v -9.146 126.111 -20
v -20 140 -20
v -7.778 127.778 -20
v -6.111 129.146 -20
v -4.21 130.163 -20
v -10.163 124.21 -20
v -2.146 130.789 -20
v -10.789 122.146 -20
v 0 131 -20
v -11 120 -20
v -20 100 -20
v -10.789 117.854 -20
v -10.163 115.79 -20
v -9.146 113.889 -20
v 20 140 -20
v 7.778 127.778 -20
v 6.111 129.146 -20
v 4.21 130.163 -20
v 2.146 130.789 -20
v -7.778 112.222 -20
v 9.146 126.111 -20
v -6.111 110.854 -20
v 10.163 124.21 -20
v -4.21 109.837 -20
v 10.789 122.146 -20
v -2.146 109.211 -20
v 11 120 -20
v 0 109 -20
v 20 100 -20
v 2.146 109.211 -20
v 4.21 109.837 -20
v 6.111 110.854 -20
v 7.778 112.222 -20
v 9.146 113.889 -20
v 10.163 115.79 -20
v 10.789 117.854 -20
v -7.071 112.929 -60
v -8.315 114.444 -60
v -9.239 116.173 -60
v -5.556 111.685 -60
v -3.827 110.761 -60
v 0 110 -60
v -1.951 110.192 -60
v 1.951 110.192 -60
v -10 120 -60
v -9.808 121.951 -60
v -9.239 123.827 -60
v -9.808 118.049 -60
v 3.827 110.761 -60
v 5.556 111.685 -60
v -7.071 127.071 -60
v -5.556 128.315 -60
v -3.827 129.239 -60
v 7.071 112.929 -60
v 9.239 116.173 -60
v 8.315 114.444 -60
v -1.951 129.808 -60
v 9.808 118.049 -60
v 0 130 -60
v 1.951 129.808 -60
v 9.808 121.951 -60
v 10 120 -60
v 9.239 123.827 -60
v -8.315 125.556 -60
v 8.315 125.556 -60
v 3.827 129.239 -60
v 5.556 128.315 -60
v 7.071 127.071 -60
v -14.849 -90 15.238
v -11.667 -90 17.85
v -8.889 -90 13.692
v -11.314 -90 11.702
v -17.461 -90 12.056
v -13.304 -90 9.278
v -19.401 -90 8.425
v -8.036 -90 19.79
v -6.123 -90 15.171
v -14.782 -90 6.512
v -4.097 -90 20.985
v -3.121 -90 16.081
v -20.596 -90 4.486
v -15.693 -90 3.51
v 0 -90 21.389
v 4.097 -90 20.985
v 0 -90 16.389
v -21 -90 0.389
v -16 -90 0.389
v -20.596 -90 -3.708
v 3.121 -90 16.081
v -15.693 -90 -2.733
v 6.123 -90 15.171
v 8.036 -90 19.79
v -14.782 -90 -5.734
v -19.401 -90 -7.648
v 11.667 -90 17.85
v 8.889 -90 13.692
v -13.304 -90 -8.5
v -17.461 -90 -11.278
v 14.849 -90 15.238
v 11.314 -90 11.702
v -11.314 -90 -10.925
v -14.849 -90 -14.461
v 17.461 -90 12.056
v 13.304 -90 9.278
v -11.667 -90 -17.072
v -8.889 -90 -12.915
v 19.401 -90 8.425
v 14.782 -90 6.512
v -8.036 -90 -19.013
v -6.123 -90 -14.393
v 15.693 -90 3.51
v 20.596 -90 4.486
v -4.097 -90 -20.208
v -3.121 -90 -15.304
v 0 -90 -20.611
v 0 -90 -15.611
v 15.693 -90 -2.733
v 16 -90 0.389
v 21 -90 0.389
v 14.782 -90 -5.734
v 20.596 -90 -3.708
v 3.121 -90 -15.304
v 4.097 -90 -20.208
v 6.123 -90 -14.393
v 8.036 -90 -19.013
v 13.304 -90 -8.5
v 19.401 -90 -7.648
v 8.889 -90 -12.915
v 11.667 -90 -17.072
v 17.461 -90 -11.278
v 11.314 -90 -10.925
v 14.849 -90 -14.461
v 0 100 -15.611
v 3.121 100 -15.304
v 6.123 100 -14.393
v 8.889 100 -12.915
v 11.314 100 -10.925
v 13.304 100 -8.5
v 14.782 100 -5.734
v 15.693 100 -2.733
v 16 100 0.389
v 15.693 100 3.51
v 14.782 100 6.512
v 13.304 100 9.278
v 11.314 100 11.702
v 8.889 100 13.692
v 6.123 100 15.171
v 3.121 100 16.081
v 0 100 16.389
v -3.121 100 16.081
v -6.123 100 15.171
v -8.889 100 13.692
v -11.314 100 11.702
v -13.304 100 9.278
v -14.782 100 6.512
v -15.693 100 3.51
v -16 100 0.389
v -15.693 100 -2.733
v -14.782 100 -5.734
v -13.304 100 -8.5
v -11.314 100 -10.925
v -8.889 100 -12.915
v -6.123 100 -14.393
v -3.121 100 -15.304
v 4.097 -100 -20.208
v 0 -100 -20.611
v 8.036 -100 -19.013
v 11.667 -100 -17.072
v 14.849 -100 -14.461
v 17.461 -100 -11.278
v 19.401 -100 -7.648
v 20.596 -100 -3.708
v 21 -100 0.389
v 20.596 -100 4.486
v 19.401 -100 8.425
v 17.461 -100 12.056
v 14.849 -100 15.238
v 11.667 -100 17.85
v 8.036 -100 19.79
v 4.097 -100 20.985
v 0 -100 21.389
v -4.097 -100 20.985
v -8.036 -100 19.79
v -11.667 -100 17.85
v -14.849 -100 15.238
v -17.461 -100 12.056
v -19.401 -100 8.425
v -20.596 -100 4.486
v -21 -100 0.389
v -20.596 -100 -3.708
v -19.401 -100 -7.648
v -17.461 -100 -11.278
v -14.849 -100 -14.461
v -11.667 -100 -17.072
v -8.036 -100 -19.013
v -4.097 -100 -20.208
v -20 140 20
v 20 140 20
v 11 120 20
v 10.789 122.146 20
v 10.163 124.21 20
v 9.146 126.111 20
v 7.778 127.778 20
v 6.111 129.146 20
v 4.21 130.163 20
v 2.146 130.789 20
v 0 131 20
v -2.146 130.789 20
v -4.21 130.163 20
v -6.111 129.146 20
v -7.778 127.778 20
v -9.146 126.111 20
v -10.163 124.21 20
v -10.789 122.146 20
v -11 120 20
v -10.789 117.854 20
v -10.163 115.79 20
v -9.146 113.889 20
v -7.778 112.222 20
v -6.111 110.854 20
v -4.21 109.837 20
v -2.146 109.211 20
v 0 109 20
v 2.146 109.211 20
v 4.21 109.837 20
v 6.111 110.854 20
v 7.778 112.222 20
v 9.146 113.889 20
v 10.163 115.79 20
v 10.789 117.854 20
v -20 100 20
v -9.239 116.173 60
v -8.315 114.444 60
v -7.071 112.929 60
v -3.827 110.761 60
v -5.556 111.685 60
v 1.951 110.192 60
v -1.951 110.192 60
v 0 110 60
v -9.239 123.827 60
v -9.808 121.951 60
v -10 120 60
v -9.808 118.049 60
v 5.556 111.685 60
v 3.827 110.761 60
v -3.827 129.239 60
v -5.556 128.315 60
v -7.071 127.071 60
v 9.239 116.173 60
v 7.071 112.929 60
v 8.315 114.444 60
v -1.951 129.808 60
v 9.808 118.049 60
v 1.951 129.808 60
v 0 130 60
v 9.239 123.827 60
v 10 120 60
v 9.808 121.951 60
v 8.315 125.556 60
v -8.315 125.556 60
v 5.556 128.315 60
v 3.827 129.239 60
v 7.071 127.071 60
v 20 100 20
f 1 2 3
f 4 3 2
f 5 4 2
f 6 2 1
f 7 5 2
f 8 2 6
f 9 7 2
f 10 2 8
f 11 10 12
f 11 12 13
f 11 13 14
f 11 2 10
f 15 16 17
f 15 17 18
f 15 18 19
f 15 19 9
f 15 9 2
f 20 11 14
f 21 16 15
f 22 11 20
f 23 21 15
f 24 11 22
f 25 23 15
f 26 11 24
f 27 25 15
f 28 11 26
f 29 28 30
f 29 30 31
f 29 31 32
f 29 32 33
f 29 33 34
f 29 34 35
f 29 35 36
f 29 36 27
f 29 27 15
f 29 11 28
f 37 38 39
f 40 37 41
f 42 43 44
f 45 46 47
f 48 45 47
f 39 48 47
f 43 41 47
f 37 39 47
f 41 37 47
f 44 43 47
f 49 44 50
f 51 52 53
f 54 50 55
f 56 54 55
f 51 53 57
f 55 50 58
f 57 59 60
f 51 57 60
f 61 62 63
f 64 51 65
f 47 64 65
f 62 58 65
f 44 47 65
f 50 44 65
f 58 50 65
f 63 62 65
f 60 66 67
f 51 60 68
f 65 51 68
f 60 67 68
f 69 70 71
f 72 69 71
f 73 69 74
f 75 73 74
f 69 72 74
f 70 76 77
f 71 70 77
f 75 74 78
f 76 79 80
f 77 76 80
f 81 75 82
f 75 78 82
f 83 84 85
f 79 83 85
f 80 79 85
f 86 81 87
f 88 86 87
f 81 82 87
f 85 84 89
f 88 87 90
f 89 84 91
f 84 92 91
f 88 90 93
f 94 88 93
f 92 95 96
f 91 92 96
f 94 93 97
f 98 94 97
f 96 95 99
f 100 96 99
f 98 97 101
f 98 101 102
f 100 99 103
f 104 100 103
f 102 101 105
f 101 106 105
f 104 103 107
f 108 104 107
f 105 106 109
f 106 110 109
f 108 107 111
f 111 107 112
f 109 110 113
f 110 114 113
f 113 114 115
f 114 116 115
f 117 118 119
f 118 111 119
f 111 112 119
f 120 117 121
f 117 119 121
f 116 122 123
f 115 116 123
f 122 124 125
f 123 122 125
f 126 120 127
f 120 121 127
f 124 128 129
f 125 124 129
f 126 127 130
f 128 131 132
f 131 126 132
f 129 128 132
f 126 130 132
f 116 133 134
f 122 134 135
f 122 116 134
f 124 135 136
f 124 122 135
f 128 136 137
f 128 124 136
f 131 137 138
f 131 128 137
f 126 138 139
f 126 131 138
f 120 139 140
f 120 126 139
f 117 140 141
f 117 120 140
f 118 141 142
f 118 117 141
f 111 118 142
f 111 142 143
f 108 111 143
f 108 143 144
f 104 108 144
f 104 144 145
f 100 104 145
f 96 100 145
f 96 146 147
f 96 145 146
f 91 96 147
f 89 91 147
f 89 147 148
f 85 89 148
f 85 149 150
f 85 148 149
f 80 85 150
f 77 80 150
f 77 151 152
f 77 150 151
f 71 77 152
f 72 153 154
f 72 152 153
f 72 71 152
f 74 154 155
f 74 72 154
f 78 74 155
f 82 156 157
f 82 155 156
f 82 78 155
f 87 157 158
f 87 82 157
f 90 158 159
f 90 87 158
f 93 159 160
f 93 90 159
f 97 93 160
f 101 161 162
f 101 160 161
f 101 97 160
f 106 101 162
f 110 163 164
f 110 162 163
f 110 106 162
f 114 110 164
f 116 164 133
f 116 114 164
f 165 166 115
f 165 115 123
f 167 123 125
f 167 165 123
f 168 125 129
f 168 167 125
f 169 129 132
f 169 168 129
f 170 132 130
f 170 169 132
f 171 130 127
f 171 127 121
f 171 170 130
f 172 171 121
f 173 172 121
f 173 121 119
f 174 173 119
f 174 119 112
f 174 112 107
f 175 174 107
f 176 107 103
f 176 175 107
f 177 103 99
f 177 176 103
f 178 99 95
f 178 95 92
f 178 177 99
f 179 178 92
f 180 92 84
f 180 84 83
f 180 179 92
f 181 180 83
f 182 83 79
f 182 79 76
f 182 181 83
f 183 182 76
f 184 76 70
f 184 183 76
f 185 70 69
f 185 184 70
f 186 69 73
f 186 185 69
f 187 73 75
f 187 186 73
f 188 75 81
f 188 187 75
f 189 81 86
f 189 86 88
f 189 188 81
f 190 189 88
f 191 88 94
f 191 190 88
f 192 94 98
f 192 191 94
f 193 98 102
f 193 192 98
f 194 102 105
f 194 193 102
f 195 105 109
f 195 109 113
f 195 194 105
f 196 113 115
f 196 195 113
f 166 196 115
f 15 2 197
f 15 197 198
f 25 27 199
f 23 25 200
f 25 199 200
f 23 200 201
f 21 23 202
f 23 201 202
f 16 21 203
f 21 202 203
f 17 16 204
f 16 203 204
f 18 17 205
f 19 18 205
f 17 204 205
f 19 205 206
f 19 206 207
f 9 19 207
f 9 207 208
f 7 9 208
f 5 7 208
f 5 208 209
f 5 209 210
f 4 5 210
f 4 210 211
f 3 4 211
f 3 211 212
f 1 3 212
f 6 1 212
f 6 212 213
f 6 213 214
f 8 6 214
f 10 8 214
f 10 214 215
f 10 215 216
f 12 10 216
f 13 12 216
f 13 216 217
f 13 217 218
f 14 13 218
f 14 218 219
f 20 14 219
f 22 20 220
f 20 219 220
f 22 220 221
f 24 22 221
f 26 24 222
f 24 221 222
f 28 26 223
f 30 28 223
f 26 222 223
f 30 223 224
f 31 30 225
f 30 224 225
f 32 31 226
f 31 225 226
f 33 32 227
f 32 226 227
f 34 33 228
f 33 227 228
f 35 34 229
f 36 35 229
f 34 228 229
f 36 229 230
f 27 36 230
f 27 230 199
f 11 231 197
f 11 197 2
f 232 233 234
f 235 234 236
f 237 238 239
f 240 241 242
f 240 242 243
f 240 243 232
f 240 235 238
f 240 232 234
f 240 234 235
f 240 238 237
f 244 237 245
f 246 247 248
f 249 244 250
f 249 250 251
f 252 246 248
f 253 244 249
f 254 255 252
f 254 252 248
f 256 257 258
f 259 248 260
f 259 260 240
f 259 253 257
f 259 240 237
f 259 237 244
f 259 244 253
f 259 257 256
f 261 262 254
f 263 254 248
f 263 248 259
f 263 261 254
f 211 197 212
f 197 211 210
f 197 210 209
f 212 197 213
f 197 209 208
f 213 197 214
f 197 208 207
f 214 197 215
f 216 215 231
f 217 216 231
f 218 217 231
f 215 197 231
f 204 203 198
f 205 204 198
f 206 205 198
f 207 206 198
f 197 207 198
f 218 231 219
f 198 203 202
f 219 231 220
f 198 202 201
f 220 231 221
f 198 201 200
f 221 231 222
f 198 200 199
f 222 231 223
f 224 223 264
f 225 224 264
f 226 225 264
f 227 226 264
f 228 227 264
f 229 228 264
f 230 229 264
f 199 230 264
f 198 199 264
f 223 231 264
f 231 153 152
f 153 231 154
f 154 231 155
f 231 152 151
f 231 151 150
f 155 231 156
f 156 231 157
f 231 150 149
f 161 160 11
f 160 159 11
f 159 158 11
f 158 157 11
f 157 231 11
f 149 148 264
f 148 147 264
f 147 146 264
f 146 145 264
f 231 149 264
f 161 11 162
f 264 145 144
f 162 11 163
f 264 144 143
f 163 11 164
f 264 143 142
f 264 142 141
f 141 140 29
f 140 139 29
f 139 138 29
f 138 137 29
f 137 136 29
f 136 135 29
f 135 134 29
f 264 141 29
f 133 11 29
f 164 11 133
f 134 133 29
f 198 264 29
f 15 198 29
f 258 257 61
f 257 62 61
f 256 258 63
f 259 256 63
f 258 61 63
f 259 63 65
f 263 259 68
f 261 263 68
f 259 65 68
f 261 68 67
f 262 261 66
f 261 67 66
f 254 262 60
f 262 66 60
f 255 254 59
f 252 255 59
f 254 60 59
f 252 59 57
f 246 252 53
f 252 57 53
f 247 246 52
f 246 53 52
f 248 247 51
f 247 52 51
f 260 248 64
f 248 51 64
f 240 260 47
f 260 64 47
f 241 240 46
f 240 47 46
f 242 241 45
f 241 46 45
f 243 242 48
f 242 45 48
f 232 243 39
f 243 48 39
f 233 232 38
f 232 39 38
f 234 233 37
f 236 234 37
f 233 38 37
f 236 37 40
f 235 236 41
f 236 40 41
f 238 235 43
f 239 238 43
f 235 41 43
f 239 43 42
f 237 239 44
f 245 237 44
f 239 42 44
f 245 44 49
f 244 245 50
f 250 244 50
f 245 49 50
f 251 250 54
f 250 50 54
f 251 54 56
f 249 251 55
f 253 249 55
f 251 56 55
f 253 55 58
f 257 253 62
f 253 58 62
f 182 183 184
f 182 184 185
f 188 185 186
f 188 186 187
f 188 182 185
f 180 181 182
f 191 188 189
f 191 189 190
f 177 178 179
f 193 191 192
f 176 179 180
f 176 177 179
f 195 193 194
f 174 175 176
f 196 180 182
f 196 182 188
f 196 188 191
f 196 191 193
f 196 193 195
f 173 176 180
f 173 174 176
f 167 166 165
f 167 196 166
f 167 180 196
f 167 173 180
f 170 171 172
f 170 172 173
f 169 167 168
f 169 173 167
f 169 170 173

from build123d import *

# Parameters (mm, degrees)
SKETCH1_R                = 16
BOSS_EXTRUDE1_DEPTH      = 100
SKETCH2_W                = 40
SKETCH2_H                = 40
BOSS_EXTRUDE2_DEPTH      = 40
BOSS_EXTRUDE3_DEPTH      = 40
BOSS_EXTRUDE3_DEPTH_BACK = 80
SKETCH3_R                = 10
BOSS_EXTRUDE4_START      = 100
SKETCH4_R                = 16
BOSS_EXTRUDE4_DEPTH      = 100
SKETCH5_R                = 21
SKETCH5_R_2              = 16
BOSS_EXTRUDE5_DEPTH      = 10
SKETCH6_R                = 11
SKETCH6_R_2              = 10
CUT_EXTRUDE1_DEPTH       = 100


with BuildPart() as part:
    # Sketch1 → Boss-Extrude1 (new body)
    with BuildSketch(Plane(origin=(0, 0, 0), x_dir=(1, 0, 0), z_dir=(0, 1, 0))):
        with Locations(Location((0, -0.388679949, 0), (0, 0, 90))):
            Circle(SKETCH1_R)
    extrude(amount=BOSS_EXTRUDE1_DEPTH)

    # Sketch2 → Boss-Extrude2 (add)
    with BuildSketch(Plane(origin=(0, 100, 0), x_dir=(1, 0, 0), z_dir=(0, 1, 0))):
        Rectangle(SKETCH2_W, SKETCH2_H)
    extrude(amount=BOSS_EXTRUDE2_DEPTH)

    # Sketch3 → Boss-Extrude3 (add, two sides: drawn at the far end of the back side and taken through both)
    with BuildSketch(Plane.XY.offset(20).offset(-BOSS_EXTRUDE3_DEPTH_BACK)):
        with Locations((0, 120)):
            Circle(SKETCH3_R)
    extrude(amount=BOSS_EXTRUDE3_DEPTH + BOSS_EXTRUDE3_DEPTH_BACK)

    # Sketch4 → Boss-Extrude4 (add)
    with BuildSketch(Plane.XZ.offset(BOSS_EXTRUDE4_START)):
        with Locations(Location((0, 0.388679949, 0), (0, 0, 270))):
            Circle(SKETCH4_R)
    extrude(amount=-BOSS_EXTRUDE4_DEPTH)

    # Sketch5 → Boss-Extrude5 (add)
    with BuildSketch(Plane.XZ.offset(100)):
        with Locations(Location((0, 0.388679949, 0), (0, 0, 270))):
            Circle(SKETCH5_R)
        with Locations(Location((0, 0.388679949, 0), (0, 0, 270))):
            Circle(SKETCH5_R_2, mode=Mode.SUBTRACT)
    extrude(amount=-BOSS_EXTRUDE5_DEPTH)

    # Sketch6 → Cut-Extrude1 (cut)
    with BuildSketch(Plane.XY.offset(60)):
        with Locations((0, 120)):
            Circle(SKETCH6_R)
        with Locations((0, 120)):
            Circle(SKETCH6_R_2, mode=Mode.SUBTRACT)
    extrude(amount=-CUT_EXTRUDE1_DEPTH, mode=Mode.SUBTRACT)


with BuildPart() as cut_extrude1_piece_1:
    # of the separate pieces the step leaves, piece 1, a body of its own (cut_extrude1_pieces)
    add(part.part.solids().sort_by_distance((-20, 100, 20))[0])


with BuildPart() as cut_extrude1_piece_2:
    # of the separate pieces the step leaves, piece 2, a body of its own (cut_extrude1_pieces)
    add(part.part.solids().sort_by_distance((10, 120, 60))[0])


solid = Compound([cut_extrude1_piece_1.part, cut_extrude1_piece_2.part])
